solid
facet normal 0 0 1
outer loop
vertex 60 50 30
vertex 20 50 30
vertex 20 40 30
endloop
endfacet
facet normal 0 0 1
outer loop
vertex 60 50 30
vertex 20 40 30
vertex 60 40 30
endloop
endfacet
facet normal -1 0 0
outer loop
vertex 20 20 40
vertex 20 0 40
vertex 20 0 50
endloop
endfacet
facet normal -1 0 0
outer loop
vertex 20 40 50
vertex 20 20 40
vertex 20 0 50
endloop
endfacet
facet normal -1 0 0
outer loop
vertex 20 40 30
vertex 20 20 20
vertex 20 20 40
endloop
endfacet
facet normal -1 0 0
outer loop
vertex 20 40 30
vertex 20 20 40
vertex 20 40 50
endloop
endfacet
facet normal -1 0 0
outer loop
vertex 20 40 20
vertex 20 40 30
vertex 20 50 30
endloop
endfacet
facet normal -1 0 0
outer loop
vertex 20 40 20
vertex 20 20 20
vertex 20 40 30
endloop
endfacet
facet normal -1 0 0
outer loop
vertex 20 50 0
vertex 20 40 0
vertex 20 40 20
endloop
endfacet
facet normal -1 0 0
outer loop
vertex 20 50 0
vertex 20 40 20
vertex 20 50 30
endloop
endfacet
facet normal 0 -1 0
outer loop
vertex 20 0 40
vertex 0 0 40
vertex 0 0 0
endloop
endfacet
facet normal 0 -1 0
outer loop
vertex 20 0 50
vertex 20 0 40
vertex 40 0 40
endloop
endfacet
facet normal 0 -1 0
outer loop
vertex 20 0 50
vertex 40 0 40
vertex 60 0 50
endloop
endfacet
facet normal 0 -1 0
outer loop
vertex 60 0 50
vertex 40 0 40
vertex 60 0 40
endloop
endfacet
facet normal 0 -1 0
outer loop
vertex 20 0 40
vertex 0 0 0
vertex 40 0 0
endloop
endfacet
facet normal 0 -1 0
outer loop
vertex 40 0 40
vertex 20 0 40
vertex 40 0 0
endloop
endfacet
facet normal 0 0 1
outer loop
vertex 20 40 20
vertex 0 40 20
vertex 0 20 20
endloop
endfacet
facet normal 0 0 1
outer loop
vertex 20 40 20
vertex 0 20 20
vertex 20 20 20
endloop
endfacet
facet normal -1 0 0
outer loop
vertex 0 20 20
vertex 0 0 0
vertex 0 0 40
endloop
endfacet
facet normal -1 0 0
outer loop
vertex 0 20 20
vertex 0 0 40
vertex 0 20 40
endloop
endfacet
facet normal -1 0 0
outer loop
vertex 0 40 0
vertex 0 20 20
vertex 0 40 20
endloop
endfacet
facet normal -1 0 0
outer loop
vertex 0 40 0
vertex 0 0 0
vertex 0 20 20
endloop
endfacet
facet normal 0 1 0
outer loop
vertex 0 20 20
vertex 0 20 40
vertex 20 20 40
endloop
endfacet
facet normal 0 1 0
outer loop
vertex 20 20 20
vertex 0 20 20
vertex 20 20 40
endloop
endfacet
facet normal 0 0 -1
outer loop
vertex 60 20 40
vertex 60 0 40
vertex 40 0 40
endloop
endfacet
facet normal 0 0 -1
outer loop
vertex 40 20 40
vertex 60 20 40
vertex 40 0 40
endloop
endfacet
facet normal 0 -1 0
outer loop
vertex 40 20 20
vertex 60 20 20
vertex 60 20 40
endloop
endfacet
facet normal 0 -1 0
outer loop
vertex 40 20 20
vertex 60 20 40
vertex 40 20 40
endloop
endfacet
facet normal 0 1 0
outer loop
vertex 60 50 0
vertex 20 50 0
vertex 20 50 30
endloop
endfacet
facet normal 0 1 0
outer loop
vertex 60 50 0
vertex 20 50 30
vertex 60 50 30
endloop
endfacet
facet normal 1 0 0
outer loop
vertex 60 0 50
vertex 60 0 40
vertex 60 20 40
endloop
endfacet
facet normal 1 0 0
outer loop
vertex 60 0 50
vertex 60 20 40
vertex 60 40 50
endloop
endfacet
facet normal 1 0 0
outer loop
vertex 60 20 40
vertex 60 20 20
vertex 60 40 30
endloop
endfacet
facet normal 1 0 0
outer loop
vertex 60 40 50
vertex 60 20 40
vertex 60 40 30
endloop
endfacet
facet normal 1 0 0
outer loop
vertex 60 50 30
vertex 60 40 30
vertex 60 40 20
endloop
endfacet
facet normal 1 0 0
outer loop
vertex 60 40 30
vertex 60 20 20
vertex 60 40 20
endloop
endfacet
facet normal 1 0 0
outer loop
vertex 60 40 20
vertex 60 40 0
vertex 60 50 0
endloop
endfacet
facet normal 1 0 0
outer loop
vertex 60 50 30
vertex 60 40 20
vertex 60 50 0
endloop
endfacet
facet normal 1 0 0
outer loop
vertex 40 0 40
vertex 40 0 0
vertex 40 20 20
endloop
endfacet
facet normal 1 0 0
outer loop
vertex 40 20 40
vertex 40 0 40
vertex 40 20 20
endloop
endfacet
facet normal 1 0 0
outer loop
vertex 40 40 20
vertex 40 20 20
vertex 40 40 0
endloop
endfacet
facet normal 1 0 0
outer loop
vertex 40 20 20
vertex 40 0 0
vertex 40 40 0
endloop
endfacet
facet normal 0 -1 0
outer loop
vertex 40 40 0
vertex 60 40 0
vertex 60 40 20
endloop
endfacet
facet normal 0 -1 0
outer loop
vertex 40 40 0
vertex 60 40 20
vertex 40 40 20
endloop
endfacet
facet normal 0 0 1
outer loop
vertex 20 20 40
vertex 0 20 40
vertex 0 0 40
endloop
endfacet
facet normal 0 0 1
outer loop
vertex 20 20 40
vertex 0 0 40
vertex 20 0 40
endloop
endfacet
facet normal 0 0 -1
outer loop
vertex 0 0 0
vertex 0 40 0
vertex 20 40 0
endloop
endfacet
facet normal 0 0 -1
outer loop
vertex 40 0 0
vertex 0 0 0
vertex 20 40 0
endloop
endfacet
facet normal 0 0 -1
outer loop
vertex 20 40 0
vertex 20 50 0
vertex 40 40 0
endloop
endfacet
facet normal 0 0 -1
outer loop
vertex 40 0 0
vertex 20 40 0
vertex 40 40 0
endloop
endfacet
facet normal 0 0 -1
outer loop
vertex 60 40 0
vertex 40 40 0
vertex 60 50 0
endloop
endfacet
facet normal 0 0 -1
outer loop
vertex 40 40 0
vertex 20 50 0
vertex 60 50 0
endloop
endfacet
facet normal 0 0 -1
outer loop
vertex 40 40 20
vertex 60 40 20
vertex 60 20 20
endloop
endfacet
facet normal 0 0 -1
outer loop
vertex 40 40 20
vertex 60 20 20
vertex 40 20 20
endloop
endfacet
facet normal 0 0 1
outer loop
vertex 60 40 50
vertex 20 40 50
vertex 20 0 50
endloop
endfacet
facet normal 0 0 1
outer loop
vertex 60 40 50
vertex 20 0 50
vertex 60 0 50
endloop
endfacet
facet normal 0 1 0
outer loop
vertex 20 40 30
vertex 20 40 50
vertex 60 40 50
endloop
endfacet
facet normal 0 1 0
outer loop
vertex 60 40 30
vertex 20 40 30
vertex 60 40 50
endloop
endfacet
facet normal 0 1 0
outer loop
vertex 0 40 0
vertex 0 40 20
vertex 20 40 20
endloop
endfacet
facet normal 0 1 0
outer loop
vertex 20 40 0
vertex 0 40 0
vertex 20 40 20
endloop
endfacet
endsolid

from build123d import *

# Parameters (mm, degrees)
SKETCH1_W           = 60
SKETCH1_H           = 50
BOSS_EXTRUDE1_DEPTH = 50
SKETCH2_W           = 20
SKETCH2_H           = 10
CUT_EXTRUDE1_DEPTH  = 50
SKETCH3_W           = 20
SKETCH3_H           = 20
CUT_EXTRUDE2_DEPTH  = 20
SKETCH4_W           = 40
SKETCH4_H           = 10
CUT_EXTRUDE3_DEPTH  = 30
SKETCH5_W           = 20
SKETCH5_H           = 20
CUT_EXTRUDE4_DEPTH  = 10
SKETCH6_W           = 20
SKETCH6_H           = 20
CUT_EXTRUDE5_DEPTH  = 10
SKETCH8_W           = 40
SKETCH8_H           = 10
BOSS_EXTRUDE2_DEPTH = 10
SKETCH9_W           = 20
SKETCH9_H           = 40
CUT_EXTRUDE6_DEPTH  = 20
SKETCH10_W          = 20
SKETCH10_H          = 20
CUT_EXTRUDE7_DEPTH  = 20


with BuildPart() as part:
    # Sketch1 → Boss-Extrude1 (new body)
    with BuildSketch(Plane.XY):
        with Locations((30, 25)):
            Rectangle(SKETCH1_W, SKETCH1_H)
    extrude(amount=BOSS_EXTRUDE1_DEPTH)

    # Sketch2 → Cut-Extrude1 (cut)
    with BuildSketch(Plane.XY.offset(50)):
        with Locations((10, 45)):
            Rectangle(SKETCH2_W, SKETCH2_H)
    extrude(amount=-CUT_EXTRUDE1_DEPTH, mode=Mode.SUBTRACT)

    # Sketch3 → Cut-Extrude2 (cut)
    with BuildSketch(Plane.XY.offset(50)):
        with Locations((10, 30)):
            Rectangle(SKETCH3_W, SKETCH3_H)
    extrude(amount=-CUT_EXTRUDE2_DEPTH, mode=Mode.SUBTRACT)

    # Sketch4 → Cut-Extrude3 (cut)
    with BuildSketch(Plane.XY.offset(50)):
        with Locations((40, 45)):
            Rectangle(SKETCH4_W, SKETCH4_H)
    extrude(amount=-CUT_EXTRUDE3_DEPTH, mode=Mode.SUBTRACT)

    # Sketch5 → Cut-Extrude4 (cut)
    with BuildSketch(Plane.XY.offset(30)):
        with Locations((10, 30)):
            Rectangle(SKETCH5_W, SKETCH5_H)
    extrude(amount=-CUT_EXTRUDE4_DEPTH, mode=Mode.SUBTRACT)

    # Sketch6 → Cut-Extrude5 (cut)
    with BuildSketch(Plane.XY.offset(50)):
        with Locations((10, 10)):
            Rectangle(SKETCH6_W, SKETCH6_H)
    extrude(amount=-CUT_EXTRUDE5_DEPTH, mode=Mode.SUBTRACT)

    # Sketch8 → Boss-Extrude2 (add)
    with BuildSketch(Plane.XY.offset(20)):
        with Locations((40, 45)):
            Rectangle(SKETCH8_W, SKETCH8_H)
    extrude(amount=BOSS_EXTRUDE2_DEPTH)

    # Sketch9 → Cut-Extrude6 (cut)
    with BuildSketch(Plane(origin=(0, 0, 0), x_dir=(-1, 0, 0), z_dir=(0, -1, 0))):
        with Locations((-50, -20)):
            Rectangle(SKETCH9_W, SKETCH9_H)
    extrude(amount=-CUT_EXTRUDE6_DEPTH, mode=Mode.SUBTRACT)

    # Sketch10 → Cut-Extrude7 (cut)
    with BuildSketch(Plane(origin=(0, 0, 0), x_dir=(-1, 0, 0), z_dir=(0, 0, -1))):
        with Locations((-50, 30)):
            Rectangle(SKETCH10_W, SKETCH10_H)
    extrude(amount=-CUT_EXTRUDE7_DEPTH, mode=Mode.SUBTRACT)


solid = part.part
